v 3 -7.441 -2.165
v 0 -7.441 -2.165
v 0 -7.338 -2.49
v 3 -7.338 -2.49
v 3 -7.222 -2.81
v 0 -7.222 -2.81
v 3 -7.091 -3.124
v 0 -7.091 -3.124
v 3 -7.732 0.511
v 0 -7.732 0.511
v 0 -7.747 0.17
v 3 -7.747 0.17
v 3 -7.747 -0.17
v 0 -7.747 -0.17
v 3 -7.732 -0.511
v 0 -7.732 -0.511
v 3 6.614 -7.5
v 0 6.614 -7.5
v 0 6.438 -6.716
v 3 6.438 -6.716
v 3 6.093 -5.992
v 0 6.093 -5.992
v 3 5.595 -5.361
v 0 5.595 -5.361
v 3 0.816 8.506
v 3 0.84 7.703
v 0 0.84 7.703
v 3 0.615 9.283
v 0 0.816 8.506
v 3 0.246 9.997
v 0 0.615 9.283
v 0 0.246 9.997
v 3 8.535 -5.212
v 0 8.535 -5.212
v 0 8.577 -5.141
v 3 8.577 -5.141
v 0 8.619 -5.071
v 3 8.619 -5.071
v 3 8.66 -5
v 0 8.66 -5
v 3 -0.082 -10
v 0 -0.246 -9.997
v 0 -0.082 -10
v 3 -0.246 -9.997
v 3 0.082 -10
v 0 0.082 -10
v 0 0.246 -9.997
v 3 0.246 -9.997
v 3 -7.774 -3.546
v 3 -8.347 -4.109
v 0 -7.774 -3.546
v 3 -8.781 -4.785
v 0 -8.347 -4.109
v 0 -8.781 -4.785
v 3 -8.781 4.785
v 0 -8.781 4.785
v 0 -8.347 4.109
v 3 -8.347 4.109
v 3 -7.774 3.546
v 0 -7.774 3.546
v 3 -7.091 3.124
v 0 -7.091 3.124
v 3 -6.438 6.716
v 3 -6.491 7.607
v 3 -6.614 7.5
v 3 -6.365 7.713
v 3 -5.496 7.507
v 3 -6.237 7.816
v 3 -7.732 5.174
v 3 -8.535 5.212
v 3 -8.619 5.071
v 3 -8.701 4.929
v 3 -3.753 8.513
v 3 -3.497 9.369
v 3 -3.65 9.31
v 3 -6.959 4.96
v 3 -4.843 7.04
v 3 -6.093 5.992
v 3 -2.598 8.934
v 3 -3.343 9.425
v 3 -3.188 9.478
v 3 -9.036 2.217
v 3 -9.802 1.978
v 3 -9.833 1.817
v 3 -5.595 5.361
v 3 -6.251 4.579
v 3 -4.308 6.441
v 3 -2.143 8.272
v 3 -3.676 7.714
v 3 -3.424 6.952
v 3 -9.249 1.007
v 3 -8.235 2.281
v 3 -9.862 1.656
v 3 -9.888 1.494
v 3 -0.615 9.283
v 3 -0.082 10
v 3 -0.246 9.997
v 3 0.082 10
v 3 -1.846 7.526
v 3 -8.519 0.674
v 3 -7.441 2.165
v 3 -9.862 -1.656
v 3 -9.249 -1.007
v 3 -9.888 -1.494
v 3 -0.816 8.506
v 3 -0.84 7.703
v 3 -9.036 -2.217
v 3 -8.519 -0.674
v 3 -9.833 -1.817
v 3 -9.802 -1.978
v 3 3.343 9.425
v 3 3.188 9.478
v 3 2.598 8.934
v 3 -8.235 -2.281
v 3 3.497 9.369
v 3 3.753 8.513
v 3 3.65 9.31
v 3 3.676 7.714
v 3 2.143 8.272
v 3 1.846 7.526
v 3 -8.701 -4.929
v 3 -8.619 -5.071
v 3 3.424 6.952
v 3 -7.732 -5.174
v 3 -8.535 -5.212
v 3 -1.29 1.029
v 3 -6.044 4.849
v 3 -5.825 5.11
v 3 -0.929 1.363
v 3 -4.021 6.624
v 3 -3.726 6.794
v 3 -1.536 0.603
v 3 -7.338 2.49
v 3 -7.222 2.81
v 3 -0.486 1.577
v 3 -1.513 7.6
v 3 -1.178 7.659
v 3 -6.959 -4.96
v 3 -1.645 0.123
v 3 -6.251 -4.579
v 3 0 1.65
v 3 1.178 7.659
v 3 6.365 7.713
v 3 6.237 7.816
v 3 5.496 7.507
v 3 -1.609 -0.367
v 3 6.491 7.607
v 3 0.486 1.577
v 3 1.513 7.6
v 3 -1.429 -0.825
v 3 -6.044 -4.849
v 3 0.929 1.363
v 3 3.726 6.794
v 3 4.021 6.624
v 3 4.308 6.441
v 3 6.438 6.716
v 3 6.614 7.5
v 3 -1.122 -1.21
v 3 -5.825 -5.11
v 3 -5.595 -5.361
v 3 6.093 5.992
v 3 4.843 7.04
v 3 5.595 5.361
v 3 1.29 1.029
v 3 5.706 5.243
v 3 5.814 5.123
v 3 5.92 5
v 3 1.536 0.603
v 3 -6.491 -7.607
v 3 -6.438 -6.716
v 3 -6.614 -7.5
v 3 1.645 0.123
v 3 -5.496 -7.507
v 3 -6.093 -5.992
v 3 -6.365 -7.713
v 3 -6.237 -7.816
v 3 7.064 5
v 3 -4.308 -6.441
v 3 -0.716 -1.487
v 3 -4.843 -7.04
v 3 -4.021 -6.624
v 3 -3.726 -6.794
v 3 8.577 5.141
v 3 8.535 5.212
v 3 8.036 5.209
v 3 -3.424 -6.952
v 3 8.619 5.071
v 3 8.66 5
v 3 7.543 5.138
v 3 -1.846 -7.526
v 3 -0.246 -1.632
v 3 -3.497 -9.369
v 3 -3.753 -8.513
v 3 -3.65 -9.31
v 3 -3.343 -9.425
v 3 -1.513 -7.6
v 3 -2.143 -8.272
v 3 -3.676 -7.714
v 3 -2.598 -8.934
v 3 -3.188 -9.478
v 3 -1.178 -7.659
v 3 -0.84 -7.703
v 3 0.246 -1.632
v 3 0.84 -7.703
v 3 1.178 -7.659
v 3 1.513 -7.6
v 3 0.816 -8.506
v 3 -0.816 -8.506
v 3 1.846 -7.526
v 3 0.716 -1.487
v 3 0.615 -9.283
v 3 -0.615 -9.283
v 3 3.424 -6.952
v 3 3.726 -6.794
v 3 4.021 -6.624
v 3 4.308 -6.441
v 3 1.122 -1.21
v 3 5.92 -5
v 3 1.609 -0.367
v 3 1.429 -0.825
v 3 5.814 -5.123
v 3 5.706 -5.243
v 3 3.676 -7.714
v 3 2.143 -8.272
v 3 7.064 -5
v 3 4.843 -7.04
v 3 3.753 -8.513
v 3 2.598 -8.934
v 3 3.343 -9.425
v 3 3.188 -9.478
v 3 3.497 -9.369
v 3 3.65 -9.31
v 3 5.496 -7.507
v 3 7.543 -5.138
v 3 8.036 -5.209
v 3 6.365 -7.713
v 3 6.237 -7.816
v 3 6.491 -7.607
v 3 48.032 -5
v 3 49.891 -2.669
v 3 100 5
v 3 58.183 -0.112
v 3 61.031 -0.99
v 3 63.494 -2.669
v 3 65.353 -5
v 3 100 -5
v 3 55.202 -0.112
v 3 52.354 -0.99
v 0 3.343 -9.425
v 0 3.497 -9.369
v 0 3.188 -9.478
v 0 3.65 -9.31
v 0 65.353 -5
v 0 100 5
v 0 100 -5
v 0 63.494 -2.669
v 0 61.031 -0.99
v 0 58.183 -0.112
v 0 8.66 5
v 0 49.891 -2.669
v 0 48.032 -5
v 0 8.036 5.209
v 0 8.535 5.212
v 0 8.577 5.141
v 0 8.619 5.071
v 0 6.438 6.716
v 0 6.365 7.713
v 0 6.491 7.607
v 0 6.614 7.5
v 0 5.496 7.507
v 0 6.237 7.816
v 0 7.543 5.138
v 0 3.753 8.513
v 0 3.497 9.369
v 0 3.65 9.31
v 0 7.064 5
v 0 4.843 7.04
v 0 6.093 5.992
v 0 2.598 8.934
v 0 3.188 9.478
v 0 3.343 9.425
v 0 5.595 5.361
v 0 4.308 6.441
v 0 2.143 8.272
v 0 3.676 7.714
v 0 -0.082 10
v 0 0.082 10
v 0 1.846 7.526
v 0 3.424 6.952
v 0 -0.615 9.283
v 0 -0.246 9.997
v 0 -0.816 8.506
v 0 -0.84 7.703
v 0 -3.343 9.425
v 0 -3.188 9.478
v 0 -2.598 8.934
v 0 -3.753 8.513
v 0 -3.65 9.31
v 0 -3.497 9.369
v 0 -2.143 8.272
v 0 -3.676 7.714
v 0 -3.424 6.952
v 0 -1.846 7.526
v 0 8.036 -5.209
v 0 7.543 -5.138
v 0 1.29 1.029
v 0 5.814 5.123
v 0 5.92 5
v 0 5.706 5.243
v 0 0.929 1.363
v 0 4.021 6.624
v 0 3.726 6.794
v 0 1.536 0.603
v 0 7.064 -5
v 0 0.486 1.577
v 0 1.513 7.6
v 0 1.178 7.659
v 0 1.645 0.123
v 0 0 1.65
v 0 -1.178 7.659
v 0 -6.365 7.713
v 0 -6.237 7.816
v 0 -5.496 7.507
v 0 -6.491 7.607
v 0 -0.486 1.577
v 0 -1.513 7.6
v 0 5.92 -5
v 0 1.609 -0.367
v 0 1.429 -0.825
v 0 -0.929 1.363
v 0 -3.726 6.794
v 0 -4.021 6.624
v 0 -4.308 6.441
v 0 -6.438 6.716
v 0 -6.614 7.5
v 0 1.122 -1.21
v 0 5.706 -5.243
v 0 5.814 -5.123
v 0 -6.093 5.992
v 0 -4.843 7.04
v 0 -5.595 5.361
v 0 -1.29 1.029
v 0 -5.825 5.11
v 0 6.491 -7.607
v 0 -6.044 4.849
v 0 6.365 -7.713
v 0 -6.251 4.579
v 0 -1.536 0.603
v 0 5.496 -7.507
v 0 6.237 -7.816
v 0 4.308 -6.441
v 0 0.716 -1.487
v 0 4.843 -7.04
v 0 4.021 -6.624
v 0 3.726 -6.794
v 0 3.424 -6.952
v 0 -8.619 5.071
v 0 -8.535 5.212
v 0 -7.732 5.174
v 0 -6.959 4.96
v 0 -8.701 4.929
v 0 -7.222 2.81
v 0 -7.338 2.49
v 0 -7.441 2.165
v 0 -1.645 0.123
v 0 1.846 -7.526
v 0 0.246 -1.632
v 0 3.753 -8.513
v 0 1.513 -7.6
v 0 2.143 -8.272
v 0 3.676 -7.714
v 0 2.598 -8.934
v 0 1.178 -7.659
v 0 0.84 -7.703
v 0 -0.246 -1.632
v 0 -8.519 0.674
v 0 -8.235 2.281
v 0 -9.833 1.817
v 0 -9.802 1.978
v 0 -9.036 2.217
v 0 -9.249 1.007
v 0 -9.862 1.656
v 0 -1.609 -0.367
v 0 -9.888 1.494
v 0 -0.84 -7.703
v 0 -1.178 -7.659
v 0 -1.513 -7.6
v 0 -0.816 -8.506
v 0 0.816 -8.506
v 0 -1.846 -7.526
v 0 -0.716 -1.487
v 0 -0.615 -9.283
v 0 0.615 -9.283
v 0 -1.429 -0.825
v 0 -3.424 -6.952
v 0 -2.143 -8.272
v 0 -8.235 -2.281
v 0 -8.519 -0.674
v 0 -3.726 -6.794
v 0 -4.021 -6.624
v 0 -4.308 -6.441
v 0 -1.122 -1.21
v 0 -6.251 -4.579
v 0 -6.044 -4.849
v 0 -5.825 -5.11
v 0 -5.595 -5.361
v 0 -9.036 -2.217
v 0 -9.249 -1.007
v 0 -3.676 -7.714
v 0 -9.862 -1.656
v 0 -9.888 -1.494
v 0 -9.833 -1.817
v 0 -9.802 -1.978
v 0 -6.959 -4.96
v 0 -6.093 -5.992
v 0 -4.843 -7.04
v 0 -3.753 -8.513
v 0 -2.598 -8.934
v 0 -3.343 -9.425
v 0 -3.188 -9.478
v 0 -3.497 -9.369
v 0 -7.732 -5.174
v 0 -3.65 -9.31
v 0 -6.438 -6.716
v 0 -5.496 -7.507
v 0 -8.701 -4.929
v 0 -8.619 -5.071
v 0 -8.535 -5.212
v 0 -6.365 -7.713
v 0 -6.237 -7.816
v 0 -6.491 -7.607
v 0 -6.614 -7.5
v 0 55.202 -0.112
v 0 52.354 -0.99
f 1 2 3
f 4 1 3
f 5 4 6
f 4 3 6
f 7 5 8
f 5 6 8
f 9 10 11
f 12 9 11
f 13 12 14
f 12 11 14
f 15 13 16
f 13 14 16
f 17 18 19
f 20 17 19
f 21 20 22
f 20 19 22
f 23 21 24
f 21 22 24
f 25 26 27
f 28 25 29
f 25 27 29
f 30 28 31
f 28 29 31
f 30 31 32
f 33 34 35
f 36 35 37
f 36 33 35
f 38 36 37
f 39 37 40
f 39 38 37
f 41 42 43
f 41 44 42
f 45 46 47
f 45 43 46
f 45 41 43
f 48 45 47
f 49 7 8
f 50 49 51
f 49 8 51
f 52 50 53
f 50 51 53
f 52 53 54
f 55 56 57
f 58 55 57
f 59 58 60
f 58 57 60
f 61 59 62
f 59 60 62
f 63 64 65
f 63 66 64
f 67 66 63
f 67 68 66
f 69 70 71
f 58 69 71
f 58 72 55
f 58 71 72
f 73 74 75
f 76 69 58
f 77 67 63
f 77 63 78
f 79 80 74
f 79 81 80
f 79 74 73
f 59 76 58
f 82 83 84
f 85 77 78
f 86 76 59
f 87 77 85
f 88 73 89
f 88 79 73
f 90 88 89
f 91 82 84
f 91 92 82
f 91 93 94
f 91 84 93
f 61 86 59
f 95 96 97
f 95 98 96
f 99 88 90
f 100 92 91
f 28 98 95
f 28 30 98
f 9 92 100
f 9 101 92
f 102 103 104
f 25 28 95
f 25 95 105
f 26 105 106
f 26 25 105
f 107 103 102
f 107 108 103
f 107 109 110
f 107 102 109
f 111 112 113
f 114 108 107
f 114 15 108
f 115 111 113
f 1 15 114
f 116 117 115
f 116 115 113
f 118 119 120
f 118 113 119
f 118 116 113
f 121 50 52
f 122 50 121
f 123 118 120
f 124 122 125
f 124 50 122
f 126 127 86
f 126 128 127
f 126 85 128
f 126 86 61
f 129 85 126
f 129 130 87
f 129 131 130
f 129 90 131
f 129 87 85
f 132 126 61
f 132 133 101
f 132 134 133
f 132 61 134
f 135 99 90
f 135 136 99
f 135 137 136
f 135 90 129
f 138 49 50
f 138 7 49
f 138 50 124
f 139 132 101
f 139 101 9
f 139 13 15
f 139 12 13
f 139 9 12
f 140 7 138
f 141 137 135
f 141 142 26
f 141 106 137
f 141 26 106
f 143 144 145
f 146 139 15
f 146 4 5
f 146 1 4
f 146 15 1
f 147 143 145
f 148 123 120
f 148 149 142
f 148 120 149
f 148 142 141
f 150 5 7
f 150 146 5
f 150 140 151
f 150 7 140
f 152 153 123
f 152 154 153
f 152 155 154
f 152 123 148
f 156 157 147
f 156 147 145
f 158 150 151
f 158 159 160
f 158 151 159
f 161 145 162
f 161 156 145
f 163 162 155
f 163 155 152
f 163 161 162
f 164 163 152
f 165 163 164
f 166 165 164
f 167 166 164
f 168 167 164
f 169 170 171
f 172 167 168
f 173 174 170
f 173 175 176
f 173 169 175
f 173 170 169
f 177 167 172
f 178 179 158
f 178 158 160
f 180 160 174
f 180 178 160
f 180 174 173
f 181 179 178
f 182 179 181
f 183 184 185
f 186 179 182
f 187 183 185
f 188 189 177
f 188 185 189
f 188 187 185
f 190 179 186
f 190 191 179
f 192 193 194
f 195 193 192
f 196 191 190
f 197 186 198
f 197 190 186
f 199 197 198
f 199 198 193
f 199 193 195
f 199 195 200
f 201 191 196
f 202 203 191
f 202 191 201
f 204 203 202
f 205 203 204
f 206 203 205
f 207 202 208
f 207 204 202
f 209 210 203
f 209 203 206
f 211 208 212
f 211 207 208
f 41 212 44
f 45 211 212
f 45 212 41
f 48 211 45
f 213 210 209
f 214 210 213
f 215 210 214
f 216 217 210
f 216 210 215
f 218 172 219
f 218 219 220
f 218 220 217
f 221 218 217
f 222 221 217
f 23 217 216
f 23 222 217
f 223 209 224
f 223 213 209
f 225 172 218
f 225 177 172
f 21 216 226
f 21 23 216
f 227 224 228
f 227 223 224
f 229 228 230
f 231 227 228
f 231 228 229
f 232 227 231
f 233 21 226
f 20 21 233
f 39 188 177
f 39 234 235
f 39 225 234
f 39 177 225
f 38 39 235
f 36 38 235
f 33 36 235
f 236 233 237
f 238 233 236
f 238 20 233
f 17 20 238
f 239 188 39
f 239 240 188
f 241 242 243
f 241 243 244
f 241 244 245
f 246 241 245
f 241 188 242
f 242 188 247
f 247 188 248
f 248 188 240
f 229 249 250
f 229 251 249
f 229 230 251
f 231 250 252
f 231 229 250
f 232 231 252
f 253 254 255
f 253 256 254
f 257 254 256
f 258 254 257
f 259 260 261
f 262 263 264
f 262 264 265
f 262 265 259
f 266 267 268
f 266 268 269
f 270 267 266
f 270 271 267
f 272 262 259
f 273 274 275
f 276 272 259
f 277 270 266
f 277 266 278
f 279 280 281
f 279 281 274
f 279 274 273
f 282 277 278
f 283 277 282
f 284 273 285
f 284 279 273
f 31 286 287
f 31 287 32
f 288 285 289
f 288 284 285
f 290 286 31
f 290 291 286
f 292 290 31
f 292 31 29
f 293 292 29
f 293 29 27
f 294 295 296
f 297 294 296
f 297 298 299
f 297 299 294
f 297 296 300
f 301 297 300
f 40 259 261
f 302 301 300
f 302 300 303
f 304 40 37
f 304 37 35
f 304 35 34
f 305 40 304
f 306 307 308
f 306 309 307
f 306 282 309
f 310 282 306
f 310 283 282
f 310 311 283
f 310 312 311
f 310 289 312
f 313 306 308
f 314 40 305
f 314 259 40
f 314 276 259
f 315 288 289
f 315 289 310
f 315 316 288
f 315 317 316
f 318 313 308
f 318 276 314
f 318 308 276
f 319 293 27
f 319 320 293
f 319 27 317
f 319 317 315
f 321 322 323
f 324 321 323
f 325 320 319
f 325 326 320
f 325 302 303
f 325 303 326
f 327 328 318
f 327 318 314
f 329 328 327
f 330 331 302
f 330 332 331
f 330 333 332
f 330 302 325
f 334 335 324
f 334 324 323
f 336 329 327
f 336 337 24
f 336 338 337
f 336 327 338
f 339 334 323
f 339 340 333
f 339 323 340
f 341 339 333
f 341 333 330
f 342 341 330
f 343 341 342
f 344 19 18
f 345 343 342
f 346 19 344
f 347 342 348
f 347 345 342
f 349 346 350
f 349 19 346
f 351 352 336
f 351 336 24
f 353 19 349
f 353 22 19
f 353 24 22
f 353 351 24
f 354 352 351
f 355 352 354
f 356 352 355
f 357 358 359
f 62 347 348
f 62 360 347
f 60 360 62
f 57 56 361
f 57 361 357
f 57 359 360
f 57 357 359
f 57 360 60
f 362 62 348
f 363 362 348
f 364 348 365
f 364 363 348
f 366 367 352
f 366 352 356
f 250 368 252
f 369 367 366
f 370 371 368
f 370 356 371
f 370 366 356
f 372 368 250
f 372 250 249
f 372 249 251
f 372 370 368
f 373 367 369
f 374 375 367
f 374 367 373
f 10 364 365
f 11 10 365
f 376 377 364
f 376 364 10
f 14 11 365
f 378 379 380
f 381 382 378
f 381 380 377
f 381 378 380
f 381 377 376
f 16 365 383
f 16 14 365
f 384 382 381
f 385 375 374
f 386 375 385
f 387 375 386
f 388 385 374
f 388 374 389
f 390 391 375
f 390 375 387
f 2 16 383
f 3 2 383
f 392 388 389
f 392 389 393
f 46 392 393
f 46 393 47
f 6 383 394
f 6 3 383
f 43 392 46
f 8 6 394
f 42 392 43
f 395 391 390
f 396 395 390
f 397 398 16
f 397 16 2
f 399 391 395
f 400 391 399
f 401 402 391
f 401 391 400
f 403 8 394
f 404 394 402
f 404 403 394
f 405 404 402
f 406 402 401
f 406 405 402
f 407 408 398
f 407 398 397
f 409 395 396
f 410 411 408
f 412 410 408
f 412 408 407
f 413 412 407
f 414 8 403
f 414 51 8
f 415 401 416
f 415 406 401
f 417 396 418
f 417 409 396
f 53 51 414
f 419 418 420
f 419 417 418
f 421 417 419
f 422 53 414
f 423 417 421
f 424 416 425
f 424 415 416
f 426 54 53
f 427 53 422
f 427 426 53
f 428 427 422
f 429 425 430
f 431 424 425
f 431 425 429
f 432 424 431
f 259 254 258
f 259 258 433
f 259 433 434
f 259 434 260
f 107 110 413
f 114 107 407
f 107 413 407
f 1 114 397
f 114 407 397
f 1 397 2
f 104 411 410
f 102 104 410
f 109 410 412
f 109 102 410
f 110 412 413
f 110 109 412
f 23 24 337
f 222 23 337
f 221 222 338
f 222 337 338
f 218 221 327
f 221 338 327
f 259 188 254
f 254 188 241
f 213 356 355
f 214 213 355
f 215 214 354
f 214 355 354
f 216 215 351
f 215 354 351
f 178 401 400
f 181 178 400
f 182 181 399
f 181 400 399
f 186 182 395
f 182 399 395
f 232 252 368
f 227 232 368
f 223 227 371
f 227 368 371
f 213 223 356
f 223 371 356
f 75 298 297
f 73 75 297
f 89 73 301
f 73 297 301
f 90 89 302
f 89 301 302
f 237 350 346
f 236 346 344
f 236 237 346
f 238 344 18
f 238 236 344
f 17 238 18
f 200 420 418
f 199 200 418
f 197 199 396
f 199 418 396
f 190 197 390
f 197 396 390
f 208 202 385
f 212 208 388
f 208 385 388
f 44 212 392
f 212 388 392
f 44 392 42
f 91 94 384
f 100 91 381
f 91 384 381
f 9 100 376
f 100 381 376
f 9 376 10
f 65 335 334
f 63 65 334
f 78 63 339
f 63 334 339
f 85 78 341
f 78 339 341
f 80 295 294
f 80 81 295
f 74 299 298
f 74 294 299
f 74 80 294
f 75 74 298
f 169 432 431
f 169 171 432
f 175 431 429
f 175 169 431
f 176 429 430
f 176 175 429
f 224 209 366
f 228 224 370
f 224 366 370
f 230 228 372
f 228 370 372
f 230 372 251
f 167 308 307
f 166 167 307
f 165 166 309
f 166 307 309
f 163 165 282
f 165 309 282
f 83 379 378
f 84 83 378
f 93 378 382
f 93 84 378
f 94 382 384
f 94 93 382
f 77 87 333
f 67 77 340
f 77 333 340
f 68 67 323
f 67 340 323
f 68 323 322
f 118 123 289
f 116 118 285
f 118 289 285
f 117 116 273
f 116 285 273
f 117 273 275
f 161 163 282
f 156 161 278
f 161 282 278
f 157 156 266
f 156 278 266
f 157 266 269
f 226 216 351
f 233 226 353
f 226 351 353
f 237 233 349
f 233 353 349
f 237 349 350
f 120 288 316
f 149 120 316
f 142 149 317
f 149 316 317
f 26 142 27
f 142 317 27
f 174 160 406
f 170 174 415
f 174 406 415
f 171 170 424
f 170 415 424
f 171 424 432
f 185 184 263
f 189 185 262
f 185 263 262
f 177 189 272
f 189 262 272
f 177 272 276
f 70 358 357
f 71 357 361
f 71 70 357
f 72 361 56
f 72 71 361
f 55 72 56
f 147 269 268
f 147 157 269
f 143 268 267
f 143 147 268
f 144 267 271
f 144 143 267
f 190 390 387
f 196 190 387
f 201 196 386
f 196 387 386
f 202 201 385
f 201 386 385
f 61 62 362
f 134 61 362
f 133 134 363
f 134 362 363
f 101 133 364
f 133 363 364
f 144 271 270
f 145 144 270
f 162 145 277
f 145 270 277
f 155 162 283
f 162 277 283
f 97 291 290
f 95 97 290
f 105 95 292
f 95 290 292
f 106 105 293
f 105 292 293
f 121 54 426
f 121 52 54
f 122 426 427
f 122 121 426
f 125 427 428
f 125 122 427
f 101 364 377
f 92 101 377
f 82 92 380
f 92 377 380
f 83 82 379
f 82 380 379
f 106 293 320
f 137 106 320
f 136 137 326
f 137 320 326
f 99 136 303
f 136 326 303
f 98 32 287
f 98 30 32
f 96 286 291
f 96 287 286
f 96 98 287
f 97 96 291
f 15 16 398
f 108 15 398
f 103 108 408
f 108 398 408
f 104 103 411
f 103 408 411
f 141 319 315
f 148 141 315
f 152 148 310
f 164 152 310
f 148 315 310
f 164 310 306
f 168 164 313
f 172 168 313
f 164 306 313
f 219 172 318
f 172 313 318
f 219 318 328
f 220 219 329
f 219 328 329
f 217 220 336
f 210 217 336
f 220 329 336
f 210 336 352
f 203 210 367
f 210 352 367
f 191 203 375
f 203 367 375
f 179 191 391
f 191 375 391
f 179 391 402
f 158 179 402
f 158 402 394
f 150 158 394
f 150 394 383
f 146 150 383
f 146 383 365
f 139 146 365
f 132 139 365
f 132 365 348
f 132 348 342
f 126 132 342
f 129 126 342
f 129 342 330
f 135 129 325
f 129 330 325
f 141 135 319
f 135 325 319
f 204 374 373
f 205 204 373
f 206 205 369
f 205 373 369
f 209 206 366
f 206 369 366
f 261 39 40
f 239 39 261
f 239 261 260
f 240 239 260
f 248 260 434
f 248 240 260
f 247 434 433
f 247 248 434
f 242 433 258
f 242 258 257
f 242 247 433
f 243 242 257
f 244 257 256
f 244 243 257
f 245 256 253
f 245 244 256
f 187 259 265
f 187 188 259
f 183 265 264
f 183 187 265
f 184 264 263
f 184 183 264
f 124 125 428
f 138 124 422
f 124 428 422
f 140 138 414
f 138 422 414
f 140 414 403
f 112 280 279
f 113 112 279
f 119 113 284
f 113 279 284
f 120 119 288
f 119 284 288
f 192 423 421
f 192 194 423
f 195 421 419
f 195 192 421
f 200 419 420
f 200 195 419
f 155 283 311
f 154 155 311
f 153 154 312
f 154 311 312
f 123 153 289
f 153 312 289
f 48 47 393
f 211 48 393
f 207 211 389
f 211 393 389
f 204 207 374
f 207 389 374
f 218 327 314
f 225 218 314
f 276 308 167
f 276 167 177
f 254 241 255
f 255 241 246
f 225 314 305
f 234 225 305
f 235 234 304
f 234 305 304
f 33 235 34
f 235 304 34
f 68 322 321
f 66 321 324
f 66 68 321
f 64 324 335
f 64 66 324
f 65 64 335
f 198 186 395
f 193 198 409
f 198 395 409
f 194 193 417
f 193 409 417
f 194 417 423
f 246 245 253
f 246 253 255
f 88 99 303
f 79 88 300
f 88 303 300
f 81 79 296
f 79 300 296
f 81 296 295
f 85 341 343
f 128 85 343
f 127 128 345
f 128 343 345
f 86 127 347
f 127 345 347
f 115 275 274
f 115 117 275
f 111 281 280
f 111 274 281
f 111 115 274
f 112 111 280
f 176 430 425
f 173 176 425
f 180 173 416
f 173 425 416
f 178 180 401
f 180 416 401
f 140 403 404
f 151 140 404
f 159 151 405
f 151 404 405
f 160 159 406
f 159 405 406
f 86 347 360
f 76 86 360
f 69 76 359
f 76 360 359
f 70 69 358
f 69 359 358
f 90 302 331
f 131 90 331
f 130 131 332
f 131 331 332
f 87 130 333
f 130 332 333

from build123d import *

# Parameters (mm, degrees)
BASPROSKE_W         = 3
BASPROSKE_H         = 10
TOOTHCUT_DEPTH      = 15.456832295
TEETHCUTS_COUNT     = 18
TEETHCUTS_ANGLE     = 340
BORSKE_R            = 0.5
BORE_DEPTH          = 50.0000508
SKETCH7_W           = 10
SKETCH7_H           = 100
BOSS_EXTRUDE5_DEPTH = 3
CUT_EXTRUDE1_DEPTH  = 3
SKETCH11_R          = 1.65
CUT_EXTRUDE2_DEPTH  = 3


with BuildPart() as part:
    # BasProSke → Base-Revolve (revolve)
    with BuildSketch(Plane(origin=(0, 0, 0), x_dir=(1, 0, 0), z_dir=(0, 1, 0)), mode=Mode.PRIVATE) as base_revolve_sk:
        with Locations((1.5, 5)):
            Rectangle(BASPROSKE_W, BASPROSKE_H)
    revolve(base_revolve_sk.sketch.rotate(Axis((-10, 0, 0), (1, 0, 0)), 180), axis=Axis((-10, 0, 0), (1, 0, 0)))

    # TooCutSke → ToothCut (cut, through all)
    with BuildSketch(Plane(origin=(0, 0, 0), x_dir=(0, 0, -1), z_dir=(1, 0, 0))):
        with BuildLine():
            ThreePointArc((0.510641536, 7.732156635), (0, 7.749), (-0.510641536, 7.732156635))
            ThreePointArc((-0.510641536, 7.732156635), (-0.82619259, 8.907320741), (-1.515208602, 9.910236529))
            ThreePointArc((-1.515208602, 9.910236529), (0, 10.0254), (1.515208602, 9.910236529))
            ThreePointArc((1.515208602, 9.910236529), (0.82619259, 8.907320741), (0.510641536, 7.732156635))
        make_face()
    toothcut = extrude(amount=TOOTHCUT_DEPTH, mode=Mode.SUBTRACT)

    # TeethCuts: ToothCut ×18 about axis
    teethcuts_axis = Axis((-10, 0, 0), (1, 0, 0))
    for i in range(1, TEETHCUTS_COUNT):
        add(toothcut.rotate(teethcuts_axis, i * TEETHCUTS_ANGLE / (TEETHCUTS_COUNT - 1)), mode=Mode.SUBTRACT)

    # BorSke → Bore (cut, symmetric)
    with BuildSketch(Plane(origin=(0, 0, 0), x_dir=(0, 0, -1), z_dir=(1, 0, 0))):
        with Locations(Location((0, 0, 0), (0, 0, 180))):
            Circle(BORSKE_R)
    extrude(amount=BORE_DEPTH, both=True, mode=Mode.SUBTRACT)

    # Sketch7 → Boss-Extrude5 (add)
    with BuildSketch(Plane(origin=(3, 0, 0), x_dir=(0, 0, -1), z_dir=(1, 0, 0))):
        with Locations((0, 50)):
            Rectangle(SKETCH7_W, SKETCH7_H)
    extrude(amount=-BOSS_EXTRUDE5_DEPTH)

    # Sketch10 → Cut-Extrude1 (cut)
    with BuildSketch(Plane(origin=(3, 0, 0), x_dir=(0, 0, -1), z_dir=(1, 0, 0))):
        with BuildLine():
            Line((10, 66.692651512), (10, 46.692651512))
            ThreePointArc((10, 46.692651512), (0, 56.692651512), (10, 66.692651512))
        make_face()
    extrude(amount=-CUT_EXTRUDE1_DEPTH, mode=Mode.SUBTRACT)

    # Sketch11 → Cut-Extrude2 (cut)
    with BuildSketch(Plane.ZY):
        Circle(SKETCH11_R)
    extrude(amount=-CUT_EXTRUDE2_DEPTH, mode=Mode.SUBTRACT)


solid = part.part
